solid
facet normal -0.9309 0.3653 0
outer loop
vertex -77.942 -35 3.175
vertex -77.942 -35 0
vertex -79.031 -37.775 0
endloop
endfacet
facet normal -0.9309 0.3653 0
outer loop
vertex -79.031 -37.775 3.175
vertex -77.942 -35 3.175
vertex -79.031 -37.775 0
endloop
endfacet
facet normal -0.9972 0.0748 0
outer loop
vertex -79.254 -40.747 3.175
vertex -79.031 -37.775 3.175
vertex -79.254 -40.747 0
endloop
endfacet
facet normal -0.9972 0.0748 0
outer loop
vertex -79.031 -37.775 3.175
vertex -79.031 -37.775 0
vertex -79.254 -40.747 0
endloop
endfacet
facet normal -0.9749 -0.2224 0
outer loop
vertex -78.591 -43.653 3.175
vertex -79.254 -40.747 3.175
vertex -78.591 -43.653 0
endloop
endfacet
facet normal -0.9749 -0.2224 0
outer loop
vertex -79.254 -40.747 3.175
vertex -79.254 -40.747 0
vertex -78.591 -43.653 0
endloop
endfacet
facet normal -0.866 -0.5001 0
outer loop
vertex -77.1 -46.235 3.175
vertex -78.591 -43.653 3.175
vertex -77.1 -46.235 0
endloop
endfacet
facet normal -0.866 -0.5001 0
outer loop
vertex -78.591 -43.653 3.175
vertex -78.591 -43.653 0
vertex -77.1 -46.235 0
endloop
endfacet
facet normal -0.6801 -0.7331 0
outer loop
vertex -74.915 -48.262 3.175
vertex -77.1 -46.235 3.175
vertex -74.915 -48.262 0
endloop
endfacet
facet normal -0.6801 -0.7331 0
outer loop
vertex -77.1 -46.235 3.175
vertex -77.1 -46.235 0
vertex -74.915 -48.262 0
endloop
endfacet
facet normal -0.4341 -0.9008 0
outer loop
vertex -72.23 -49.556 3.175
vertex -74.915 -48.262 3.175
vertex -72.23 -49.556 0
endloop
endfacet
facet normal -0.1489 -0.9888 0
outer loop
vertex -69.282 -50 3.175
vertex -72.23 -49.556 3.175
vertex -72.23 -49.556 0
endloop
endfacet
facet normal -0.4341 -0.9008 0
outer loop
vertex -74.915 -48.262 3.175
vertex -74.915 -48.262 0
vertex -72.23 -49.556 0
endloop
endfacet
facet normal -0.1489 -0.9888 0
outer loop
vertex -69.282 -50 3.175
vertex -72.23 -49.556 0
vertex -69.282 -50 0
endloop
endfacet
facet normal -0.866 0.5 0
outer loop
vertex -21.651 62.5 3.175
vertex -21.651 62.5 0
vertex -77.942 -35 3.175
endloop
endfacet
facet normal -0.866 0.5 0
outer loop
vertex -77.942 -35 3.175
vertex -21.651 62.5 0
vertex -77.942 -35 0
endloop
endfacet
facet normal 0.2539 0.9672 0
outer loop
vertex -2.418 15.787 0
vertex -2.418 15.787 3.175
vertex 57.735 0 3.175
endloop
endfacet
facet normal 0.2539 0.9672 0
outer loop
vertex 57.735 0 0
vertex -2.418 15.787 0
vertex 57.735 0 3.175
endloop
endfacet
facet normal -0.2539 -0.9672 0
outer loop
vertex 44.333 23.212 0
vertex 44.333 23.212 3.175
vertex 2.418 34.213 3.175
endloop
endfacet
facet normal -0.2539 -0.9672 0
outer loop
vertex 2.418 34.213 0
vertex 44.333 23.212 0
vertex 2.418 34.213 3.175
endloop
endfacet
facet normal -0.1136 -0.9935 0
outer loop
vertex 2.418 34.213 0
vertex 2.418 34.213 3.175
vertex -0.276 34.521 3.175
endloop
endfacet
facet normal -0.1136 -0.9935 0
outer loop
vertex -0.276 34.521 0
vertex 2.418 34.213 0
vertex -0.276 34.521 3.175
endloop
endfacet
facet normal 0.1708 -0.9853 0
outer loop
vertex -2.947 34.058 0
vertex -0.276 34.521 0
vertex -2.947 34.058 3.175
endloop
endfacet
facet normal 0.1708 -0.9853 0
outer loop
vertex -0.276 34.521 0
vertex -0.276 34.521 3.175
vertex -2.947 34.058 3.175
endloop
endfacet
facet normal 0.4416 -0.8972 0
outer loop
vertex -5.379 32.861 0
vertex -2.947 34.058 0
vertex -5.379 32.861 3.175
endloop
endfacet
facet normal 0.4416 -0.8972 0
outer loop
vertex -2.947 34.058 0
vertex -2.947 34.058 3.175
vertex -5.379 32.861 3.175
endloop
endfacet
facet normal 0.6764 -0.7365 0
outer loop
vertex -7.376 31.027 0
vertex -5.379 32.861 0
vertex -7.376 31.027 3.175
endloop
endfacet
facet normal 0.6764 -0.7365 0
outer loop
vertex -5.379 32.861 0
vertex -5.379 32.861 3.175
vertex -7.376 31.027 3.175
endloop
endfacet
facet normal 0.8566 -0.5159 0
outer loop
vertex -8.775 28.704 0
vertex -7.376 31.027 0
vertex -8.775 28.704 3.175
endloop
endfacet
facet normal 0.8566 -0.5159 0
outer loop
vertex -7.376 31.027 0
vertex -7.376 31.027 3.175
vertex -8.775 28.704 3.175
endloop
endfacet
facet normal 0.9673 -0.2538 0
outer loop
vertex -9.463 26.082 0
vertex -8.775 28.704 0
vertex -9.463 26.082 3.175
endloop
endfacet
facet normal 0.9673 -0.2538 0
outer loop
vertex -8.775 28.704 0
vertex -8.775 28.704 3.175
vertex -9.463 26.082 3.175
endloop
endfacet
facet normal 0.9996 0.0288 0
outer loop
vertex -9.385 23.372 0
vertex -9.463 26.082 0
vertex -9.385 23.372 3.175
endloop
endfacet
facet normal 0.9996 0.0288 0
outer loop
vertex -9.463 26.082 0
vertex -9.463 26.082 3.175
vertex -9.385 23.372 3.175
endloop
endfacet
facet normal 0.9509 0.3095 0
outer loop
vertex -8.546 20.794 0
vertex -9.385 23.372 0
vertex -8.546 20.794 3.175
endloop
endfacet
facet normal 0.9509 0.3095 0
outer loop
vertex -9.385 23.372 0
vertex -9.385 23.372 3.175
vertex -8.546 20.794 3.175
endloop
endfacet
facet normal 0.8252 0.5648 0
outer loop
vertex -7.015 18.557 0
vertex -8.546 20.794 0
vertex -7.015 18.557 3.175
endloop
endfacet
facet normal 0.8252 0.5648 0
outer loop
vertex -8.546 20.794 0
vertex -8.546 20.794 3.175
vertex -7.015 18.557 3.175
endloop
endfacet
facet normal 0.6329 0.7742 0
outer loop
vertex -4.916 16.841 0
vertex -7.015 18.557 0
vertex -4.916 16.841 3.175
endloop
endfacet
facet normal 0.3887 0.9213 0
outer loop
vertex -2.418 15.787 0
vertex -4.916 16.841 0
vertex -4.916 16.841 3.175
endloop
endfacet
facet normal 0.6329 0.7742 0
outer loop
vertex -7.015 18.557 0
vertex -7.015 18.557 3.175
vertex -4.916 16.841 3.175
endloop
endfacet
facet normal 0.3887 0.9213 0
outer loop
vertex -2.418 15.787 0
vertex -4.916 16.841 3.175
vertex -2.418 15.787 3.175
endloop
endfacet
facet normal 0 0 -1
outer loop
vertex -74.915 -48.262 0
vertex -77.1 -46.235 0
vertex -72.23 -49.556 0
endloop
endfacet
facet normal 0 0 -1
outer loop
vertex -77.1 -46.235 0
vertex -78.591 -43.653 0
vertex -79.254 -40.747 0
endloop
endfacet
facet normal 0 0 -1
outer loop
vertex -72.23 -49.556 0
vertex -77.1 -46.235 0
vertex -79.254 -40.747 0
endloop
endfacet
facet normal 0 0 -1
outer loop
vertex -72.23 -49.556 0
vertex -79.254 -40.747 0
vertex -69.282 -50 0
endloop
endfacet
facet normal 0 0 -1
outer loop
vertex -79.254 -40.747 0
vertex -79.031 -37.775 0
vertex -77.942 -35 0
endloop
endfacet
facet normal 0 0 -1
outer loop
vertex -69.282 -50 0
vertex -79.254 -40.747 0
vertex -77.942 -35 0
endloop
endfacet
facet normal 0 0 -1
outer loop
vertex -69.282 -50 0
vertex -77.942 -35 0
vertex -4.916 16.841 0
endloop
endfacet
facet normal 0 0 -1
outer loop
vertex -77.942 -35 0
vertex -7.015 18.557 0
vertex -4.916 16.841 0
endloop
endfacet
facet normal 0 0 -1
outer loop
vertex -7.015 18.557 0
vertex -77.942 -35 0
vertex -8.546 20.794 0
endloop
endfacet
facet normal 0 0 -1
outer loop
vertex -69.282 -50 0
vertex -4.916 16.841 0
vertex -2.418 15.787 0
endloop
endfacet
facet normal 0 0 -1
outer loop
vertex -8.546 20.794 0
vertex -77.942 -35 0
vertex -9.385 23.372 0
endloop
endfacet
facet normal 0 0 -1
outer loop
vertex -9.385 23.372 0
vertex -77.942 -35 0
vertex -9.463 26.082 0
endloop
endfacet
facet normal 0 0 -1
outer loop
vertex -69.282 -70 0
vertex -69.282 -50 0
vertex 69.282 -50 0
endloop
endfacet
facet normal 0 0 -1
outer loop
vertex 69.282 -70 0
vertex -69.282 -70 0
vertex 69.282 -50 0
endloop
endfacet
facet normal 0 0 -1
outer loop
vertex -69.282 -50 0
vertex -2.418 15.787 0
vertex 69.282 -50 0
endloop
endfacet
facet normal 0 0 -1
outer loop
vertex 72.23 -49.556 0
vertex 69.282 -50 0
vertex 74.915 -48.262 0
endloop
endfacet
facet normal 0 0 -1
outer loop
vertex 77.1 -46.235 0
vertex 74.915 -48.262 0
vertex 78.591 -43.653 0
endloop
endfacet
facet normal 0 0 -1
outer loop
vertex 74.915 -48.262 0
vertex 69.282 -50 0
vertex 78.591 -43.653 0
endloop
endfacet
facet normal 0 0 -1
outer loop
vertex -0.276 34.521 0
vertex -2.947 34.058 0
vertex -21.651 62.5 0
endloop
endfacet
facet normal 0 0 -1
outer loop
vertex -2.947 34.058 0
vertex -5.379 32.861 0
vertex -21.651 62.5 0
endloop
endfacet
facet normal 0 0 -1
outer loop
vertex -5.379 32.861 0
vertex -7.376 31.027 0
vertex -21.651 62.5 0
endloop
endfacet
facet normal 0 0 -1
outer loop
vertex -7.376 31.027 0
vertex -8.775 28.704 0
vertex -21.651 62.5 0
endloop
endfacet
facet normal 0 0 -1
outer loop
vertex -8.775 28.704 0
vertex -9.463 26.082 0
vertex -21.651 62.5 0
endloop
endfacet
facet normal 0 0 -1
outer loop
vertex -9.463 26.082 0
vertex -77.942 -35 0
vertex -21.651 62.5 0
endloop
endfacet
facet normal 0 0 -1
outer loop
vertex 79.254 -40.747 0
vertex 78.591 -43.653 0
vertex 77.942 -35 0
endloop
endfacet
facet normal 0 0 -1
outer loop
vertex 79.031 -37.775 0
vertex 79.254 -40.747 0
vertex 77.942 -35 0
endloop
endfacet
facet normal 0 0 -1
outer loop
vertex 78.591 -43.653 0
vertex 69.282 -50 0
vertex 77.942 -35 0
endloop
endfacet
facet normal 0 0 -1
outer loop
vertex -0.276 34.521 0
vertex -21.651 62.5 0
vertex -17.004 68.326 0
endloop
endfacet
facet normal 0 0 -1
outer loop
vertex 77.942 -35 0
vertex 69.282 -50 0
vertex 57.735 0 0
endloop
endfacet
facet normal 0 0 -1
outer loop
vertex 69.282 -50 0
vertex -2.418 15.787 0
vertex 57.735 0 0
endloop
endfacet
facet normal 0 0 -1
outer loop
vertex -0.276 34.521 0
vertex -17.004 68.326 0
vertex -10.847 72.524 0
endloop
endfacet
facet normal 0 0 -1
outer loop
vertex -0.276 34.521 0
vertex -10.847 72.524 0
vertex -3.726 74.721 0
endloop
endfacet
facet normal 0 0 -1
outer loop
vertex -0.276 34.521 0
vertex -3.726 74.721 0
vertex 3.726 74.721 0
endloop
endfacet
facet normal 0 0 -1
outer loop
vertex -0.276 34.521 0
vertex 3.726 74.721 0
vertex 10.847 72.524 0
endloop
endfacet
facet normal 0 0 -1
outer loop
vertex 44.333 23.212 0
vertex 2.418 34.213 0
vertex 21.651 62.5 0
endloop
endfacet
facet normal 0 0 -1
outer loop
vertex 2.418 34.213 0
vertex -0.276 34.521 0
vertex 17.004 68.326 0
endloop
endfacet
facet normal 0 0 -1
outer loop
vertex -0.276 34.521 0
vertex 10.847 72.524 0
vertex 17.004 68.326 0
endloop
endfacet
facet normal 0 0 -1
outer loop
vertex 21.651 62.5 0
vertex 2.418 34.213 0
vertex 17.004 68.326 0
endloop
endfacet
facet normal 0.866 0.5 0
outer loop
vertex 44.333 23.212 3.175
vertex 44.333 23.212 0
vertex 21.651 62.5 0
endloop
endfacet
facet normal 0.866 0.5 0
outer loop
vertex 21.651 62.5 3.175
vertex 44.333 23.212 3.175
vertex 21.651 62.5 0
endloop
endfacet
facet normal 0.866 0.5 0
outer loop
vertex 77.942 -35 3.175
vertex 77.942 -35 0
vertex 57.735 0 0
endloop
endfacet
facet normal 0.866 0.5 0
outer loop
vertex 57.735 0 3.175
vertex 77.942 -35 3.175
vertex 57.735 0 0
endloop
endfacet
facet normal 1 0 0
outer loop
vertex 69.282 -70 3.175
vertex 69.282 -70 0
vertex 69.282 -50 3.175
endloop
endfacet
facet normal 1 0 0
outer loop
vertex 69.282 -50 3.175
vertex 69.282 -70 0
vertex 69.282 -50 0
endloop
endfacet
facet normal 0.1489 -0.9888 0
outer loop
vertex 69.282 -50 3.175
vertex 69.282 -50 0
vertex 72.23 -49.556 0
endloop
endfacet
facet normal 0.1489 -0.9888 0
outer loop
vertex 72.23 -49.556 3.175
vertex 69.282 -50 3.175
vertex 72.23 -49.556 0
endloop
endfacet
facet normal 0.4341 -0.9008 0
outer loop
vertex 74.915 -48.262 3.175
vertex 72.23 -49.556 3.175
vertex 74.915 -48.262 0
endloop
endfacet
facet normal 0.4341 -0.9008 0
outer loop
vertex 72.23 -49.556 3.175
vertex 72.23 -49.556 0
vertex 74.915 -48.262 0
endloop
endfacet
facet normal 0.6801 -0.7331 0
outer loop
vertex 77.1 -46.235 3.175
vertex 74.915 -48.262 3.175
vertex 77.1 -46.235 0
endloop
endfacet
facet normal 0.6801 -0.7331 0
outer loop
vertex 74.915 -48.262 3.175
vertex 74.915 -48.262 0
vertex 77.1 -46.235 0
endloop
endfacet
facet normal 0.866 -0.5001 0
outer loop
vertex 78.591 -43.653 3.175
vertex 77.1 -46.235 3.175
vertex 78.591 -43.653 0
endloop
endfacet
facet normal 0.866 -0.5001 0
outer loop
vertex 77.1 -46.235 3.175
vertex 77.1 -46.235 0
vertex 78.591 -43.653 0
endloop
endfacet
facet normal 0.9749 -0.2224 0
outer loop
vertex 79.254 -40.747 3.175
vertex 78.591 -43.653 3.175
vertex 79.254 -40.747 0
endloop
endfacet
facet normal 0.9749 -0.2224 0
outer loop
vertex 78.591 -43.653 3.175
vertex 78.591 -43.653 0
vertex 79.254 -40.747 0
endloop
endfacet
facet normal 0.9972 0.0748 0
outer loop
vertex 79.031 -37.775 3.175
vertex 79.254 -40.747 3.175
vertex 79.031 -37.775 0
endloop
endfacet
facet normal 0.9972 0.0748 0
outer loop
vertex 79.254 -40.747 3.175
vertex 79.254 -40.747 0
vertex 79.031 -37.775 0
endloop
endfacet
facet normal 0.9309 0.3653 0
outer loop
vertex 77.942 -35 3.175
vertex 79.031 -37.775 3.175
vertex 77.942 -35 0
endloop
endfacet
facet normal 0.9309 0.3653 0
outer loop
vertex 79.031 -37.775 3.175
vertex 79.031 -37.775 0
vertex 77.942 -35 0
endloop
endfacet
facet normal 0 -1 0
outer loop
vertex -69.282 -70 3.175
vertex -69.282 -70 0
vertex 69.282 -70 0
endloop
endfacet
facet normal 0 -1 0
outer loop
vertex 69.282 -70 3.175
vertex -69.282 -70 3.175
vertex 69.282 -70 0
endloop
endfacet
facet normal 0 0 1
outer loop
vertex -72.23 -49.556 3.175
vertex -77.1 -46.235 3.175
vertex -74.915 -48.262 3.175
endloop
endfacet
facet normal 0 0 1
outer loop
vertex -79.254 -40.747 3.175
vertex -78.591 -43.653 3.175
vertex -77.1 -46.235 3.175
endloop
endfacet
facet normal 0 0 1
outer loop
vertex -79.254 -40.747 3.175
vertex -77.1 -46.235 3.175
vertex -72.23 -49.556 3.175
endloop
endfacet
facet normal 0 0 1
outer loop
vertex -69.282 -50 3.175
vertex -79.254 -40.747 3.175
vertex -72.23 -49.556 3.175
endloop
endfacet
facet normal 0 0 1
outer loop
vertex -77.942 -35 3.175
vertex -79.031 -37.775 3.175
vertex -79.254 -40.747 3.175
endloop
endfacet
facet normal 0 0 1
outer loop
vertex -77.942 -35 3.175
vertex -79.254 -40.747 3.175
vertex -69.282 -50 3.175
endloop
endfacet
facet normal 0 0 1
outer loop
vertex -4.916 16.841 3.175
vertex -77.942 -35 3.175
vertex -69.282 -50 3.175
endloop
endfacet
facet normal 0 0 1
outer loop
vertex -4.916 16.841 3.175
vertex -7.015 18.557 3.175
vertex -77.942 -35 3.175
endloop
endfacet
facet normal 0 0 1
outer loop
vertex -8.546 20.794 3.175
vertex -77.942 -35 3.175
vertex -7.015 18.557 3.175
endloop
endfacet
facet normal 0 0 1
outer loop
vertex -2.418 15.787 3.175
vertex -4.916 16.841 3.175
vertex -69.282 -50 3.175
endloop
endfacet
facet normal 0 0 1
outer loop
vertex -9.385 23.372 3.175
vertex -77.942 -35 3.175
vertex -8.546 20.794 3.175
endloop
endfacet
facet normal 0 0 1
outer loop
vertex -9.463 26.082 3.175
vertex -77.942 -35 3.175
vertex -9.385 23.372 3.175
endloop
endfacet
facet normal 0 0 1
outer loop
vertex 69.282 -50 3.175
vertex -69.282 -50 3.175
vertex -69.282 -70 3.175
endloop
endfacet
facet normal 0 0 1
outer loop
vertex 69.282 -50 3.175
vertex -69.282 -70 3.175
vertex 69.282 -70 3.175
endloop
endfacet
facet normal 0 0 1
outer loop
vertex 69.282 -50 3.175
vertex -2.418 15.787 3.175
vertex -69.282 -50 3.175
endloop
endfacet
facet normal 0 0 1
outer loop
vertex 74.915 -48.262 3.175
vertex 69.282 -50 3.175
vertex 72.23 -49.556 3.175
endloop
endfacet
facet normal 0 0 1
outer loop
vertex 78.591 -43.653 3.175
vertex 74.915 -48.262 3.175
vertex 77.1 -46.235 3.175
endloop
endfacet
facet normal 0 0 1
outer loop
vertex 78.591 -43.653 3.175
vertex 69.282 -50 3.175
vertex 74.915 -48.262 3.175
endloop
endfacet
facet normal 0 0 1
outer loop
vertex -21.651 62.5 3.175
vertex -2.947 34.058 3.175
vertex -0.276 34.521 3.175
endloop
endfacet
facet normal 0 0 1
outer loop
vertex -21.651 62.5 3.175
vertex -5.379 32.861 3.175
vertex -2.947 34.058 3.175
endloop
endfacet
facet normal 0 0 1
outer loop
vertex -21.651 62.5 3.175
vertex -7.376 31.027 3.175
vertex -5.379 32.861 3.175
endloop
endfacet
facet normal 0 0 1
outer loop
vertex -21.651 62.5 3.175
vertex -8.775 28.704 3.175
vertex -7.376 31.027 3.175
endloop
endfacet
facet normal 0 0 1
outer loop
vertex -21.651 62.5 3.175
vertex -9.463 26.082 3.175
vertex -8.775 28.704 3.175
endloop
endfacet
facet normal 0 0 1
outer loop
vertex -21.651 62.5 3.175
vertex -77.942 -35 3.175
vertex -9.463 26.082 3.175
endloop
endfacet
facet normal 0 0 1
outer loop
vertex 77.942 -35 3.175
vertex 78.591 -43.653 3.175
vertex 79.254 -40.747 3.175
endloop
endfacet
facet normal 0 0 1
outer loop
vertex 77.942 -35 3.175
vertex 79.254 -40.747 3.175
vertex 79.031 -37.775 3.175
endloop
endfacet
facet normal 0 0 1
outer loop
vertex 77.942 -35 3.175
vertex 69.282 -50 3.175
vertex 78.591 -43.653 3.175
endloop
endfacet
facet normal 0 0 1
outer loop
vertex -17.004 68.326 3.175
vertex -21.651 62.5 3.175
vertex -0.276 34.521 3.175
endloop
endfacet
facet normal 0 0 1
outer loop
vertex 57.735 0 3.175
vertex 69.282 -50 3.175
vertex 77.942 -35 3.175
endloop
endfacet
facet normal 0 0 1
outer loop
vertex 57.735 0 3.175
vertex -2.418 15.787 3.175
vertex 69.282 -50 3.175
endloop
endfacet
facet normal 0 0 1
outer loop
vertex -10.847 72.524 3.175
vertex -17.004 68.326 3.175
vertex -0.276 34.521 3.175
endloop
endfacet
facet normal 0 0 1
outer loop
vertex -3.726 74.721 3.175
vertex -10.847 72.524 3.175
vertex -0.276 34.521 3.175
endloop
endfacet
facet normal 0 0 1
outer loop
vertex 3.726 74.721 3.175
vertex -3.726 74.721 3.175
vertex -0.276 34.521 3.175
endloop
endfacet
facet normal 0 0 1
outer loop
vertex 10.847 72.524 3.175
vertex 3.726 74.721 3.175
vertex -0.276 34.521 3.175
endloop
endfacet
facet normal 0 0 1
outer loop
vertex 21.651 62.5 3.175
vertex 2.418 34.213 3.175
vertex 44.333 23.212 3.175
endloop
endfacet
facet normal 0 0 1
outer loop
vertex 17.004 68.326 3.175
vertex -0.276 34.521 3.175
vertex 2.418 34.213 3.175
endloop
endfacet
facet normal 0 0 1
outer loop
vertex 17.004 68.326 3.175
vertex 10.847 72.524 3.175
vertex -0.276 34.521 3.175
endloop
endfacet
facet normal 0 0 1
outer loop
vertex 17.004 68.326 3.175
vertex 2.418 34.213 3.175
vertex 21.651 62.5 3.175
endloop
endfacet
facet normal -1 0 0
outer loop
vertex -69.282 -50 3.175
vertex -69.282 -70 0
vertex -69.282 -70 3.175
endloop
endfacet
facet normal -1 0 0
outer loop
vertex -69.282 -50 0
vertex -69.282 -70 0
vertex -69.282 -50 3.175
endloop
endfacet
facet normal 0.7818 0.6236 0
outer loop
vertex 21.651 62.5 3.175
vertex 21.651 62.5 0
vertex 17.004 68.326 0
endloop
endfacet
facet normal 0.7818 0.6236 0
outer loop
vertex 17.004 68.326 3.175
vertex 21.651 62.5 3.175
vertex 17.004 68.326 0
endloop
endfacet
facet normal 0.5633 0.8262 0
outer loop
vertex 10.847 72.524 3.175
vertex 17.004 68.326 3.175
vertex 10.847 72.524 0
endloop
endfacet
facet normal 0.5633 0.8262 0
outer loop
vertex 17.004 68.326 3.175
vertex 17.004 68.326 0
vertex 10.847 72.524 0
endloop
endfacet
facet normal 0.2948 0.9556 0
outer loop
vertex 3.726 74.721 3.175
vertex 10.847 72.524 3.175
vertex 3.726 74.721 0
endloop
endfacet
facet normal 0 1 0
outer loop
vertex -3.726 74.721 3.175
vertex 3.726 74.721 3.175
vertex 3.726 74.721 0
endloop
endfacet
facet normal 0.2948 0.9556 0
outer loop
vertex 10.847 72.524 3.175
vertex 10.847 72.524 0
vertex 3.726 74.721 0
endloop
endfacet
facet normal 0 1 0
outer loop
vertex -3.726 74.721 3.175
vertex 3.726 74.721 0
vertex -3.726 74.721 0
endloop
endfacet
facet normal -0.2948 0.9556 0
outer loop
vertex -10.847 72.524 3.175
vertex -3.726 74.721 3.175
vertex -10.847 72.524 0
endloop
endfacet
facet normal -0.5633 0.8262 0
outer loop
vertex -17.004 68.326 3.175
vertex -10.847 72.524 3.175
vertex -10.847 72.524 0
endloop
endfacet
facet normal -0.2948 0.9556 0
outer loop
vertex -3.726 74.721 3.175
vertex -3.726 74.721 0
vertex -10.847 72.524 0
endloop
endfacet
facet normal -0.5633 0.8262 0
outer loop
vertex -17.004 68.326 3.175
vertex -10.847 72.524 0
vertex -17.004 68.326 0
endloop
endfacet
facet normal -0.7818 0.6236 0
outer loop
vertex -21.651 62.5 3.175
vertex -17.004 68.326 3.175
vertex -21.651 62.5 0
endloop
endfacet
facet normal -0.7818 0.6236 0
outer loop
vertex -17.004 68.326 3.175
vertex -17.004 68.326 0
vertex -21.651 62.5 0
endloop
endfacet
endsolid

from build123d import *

# Parameters (mm, degrees)
F0_W     = 138.5640646055
F0_H     = 20
F1_DEPTH = 3.175
F3_DEPTH = 3.175


# Not quite as in the source:
# - a length typed as a fraction of an inch, garbled in the dataset ("3 / 203.2 mm" for 3/8 in), is restored


with BuildPart() as f1:
    # F0 (on Top) → F1 (new body)
    with BuildSketch(Plane.XY):
        with BuildLine():
            Line((77.9422863406, -35), (21.6506350946, 62.5))
            ThreePointArc((21.6506350946, 62.5), (0, 75), (-21.6506350946, 62.5))
            Line((-21.6506350946, 62.5), (-77.9422863406, -35))
            ThreePointArc((-77.9422863406, -35), (-77.9422863406, -45), (-69.2820323028, -50))
            Line((-69.2820323028, -50), (69.2820323028, -50))
            ThreePointArc((69.2820323028, -50), (77.9422863406, -45), (77.9422863406, -35))
        make_face()
        with Locations((0, -60)):
            Rectangle(F0_W, F0_H)
    extrude(amount=F1_DEPTH)

    # F2 (on face) → F3 (cut, through all)
    with BuildSketch(Plane.XY.offset(3.175)):
        with BuildLine():
            ThreePointArc((2.4179291552, 34.2129931944), (7.5417637262, 30.8178539771), (9.525, 25))
            ThreePointArc((9.525, 25), (5.8178542624, 17.4582364939), (-2.4179284582, 15.7870066226))
            Line((-2.4179284582, 15.7870066226), (57.735026919, 0))
            Line((57.735026919, 0), (44.3333494626, 23.2123862611))
            Line((44.3333494626, 23.2123862611), (2.4179291552, 34.2129931944))
        make_face()
        with BuildLine():
            ThreePointArc((-2.4179284582, 15.7870066226), (5.8178542624, 17.4582364939), (9.525, 25))
            ThreePointArc((9.525, 25), (7.5417637262, 30.8178539771), (2.4179291552, 34.2129931944))
            ThreePointArc((2.4179291552, 34.2129931944), (-9.2129932859, 27.4179288067), (-2.4179284582, 15.7870066226))
        make_face()
    extrude(amount=-F3_DEPTH, mode=Mode.SUBTRACT)


solid = f1.part
